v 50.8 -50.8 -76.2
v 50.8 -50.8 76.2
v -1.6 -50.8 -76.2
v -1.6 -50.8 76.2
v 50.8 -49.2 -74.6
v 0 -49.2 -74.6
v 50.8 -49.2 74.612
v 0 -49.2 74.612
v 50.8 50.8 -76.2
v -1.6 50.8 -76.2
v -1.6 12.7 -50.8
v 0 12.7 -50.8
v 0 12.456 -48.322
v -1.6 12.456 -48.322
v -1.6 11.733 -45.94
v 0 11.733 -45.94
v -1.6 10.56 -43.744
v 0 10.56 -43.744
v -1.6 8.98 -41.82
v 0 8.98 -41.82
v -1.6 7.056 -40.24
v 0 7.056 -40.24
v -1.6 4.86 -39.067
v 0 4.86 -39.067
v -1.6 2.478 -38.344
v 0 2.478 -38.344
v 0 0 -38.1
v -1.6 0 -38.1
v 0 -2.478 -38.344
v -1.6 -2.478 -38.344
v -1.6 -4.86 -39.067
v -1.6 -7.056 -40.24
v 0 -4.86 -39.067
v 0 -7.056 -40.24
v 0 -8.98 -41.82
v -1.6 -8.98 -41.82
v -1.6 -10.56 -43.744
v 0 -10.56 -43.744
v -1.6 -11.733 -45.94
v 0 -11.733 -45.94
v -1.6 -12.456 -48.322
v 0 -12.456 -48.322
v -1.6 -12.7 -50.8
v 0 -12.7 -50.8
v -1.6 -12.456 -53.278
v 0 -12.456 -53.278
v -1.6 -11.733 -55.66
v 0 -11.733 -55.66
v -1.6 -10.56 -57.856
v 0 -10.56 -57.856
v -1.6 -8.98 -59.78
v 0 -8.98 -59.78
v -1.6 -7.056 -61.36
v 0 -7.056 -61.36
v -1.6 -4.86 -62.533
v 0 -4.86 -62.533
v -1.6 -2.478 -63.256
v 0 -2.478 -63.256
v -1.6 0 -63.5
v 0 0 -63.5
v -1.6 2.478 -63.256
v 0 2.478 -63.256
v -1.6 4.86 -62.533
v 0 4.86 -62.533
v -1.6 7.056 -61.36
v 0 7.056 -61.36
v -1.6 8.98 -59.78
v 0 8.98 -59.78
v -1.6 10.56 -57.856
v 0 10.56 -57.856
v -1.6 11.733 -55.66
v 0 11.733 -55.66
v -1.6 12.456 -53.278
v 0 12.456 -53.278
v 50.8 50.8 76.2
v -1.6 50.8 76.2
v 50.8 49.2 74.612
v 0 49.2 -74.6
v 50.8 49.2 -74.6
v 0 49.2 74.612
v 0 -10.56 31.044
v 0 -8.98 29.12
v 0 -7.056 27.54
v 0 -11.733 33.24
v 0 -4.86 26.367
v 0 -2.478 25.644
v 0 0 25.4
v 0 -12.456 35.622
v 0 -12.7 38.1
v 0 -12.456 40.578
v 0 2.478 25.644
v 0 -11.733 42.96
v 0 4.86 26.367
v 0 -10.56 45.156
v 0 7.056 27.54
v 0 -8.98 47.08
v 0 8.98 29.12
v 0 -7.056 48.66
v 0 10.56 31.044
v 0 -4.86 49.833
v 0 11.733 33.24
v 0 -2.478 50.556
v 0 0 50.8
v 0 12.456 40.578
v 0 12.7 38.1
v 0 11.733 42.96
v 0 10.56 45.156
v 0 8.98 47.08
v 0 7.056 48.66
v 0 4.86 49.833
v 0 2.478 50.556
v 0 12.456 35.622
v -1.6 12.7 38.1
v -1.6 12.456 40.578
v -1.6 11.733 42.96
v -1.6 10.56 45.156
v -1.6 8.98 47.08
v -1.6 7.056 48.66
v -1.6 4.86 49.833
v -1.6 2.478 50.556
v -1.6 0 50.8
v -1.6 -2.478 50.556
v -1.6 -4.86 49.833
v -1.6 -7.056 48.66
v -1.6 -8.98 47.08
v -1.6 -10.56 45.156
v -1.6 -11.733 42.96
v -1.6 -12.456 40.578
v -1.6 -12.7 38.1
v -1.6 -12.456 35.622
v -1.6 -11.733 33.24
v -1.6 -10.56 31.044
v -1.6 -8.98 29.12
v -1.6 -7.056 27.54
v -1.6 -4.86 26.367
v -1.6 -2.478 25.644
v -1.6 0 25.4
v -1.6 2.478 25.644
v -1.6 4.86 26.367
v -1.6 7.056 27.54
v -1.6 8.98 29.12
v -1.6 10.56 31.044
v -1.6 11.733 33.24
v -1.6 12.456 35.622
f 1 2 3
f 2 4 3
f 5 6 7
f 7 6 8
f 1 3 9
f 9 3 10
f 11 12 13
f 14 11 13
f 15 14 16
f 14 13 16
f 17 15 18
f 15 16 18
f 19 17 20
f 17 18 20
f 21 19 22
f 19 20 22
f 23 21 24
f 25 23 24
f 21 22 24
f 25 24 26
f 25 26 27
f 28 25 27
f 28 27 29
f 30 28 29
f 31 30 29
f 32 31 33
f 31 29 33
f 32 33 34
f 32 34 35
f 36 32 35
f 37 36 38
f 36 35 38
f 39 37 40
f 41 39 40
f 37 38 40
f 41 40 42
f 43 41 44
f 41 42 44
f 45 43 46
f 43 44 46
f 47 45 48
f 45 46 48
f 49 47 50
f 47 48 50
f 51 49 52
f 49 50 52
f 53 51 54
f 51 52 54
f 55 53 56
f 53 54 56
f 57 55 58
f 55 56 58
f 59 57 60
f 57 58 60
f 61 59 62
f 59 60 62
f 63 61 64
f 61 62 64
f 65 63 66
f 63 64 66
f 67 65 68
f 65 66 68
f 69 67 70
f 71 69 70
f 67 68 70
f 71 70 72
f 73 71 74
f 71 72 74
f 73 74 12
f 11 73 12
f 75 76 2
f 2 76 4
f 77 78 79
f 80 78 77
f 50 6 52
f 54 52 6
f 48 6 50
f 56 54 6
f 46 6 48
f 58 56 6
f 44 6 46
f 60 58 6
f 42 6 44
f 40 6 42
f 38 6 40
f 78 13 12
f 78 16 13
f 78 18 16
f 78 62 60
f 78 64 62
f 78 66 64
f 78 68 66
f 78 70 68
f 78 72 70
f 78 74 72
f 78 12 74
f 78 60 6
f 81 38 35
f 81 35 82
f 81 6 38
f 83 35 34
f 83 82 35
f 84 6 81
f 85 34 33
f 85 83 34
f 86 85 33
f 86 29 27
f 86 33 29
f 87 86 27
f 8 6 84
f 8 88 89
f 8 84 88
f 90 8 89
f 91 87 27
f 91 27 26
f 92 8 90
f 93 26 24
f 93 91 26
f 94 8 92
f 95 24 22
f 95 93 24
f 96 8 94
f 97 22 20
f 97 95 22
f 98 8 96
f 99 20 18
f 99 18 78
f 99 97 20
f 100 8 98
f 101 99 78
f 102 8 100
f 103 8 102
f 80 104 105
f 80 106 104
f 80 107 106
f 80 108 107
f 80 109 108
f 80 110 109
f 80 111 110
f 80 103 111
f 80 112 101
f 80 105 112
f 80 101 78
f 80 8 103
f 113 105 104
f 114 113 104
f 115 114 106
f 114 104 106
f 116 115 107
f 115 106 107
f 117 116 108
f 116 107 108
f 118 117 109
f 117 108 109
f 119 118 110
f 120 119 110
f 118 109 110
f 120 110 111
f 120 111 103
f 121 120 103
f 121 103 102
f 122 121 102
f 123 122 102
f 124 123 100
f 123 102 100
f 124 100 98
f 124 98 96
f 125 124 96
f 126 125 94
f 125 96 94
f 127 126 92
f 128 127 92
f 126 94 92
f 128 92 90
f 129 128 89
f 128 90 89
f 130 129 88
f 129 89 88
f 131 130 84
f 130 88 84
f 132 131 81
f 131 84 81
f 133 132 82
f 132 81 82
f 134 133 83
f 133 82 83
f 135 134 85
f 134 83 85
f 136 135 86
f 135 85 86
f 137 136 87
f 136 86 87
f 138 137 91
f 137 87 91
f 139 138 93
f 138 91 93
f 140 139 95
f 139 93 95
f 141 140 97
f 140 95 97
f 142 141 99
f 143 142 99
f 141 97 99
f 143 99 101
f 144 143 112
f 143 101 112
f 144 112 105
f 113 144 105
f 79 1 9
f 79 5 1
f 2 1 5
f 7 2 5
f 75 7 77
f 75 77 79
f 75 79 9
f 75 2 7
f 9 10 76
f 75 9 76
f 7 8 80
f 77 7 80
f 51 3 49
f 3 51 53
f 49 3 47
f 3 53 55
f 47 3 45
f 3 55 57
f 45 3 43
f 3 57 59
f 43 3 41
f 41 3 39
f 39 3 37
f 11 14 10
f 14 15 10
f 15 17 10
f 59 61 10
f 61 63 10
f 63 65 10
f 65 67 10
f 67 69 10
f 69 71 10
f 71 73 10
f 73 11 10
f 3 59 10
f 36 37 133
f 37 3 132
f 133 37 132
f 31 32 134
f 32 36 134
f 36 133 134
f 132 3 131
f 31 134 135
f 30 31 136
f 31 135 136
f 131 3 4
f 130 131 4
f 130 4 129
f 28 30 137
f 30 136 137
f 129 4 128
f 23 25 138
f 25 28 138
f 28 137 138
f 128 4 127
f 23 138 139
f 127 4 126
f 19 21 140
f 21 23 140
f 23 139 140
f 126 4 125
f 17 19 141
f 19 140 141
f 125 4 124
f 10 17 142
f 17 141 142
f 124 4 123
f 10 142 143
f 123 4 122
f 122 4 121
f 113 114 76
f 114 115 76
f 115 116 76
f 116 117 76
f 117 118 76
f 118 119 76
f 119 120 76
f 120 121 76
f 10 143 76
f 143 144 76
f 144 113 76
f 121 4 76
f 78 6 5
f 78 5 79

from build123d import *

# Parameters (mm, degrees)
F0_W     = 98.3996
F0_H     = 149.2123
F1_DEPTH = 1.6002
F2_DEPTH = 50.8
F3_R     = 12.7
F4_DEPTH = 1.6002


with BuildPart() as f1:
    # F0 (on Right) → F1 (new body)
    with BuildSketch(Plane.YZ):
        Polygon((50.8, 76.2), (0, 76.2), (-50.8, 76.2), (-50.8, 0), (-50.8, -76.2), (0, -76.2), (50.8, -76.2), (50.8, 0), align=None)
        with Locations((0, 0.00635)):
            Rectangle(F0_W, F0_H, mode=Mode.SUBTRACT)
        with Locations((0, 0.00635)):
            Rectangle(F0_W, F0_H)
    extrude(amount=-F1_DEPTH)

    # F0 (on Right) → F2 (join)
    with BuildSketch(Plane.YZ):
        Polygon((50.8, 76.2), (0, 76.2), (-50.8, 76.2), (-50.8, 0), (-50.8, -76.2), (0, -76.2), (50.8, -76.2), (50.8, 0), align=None)
        with Locations((0, 0.00635)):
            Rectangle(F0_W, F0_H, mode=Mode.SUBTRACT)
    extrude(amount=F2_DEPTH)

    # F3 (on face) → F4 (cut)
    with BuildSketch(Plane.YZ):
        with Locations((0, 38.1)):
            Circle(F3_R)
        with Locations((0, -50.8)):
            Circle(F3_R)
    extrude(amount=-F4_DEPTH, mode=Mode.SUBTRACT)


solid = f1.part
